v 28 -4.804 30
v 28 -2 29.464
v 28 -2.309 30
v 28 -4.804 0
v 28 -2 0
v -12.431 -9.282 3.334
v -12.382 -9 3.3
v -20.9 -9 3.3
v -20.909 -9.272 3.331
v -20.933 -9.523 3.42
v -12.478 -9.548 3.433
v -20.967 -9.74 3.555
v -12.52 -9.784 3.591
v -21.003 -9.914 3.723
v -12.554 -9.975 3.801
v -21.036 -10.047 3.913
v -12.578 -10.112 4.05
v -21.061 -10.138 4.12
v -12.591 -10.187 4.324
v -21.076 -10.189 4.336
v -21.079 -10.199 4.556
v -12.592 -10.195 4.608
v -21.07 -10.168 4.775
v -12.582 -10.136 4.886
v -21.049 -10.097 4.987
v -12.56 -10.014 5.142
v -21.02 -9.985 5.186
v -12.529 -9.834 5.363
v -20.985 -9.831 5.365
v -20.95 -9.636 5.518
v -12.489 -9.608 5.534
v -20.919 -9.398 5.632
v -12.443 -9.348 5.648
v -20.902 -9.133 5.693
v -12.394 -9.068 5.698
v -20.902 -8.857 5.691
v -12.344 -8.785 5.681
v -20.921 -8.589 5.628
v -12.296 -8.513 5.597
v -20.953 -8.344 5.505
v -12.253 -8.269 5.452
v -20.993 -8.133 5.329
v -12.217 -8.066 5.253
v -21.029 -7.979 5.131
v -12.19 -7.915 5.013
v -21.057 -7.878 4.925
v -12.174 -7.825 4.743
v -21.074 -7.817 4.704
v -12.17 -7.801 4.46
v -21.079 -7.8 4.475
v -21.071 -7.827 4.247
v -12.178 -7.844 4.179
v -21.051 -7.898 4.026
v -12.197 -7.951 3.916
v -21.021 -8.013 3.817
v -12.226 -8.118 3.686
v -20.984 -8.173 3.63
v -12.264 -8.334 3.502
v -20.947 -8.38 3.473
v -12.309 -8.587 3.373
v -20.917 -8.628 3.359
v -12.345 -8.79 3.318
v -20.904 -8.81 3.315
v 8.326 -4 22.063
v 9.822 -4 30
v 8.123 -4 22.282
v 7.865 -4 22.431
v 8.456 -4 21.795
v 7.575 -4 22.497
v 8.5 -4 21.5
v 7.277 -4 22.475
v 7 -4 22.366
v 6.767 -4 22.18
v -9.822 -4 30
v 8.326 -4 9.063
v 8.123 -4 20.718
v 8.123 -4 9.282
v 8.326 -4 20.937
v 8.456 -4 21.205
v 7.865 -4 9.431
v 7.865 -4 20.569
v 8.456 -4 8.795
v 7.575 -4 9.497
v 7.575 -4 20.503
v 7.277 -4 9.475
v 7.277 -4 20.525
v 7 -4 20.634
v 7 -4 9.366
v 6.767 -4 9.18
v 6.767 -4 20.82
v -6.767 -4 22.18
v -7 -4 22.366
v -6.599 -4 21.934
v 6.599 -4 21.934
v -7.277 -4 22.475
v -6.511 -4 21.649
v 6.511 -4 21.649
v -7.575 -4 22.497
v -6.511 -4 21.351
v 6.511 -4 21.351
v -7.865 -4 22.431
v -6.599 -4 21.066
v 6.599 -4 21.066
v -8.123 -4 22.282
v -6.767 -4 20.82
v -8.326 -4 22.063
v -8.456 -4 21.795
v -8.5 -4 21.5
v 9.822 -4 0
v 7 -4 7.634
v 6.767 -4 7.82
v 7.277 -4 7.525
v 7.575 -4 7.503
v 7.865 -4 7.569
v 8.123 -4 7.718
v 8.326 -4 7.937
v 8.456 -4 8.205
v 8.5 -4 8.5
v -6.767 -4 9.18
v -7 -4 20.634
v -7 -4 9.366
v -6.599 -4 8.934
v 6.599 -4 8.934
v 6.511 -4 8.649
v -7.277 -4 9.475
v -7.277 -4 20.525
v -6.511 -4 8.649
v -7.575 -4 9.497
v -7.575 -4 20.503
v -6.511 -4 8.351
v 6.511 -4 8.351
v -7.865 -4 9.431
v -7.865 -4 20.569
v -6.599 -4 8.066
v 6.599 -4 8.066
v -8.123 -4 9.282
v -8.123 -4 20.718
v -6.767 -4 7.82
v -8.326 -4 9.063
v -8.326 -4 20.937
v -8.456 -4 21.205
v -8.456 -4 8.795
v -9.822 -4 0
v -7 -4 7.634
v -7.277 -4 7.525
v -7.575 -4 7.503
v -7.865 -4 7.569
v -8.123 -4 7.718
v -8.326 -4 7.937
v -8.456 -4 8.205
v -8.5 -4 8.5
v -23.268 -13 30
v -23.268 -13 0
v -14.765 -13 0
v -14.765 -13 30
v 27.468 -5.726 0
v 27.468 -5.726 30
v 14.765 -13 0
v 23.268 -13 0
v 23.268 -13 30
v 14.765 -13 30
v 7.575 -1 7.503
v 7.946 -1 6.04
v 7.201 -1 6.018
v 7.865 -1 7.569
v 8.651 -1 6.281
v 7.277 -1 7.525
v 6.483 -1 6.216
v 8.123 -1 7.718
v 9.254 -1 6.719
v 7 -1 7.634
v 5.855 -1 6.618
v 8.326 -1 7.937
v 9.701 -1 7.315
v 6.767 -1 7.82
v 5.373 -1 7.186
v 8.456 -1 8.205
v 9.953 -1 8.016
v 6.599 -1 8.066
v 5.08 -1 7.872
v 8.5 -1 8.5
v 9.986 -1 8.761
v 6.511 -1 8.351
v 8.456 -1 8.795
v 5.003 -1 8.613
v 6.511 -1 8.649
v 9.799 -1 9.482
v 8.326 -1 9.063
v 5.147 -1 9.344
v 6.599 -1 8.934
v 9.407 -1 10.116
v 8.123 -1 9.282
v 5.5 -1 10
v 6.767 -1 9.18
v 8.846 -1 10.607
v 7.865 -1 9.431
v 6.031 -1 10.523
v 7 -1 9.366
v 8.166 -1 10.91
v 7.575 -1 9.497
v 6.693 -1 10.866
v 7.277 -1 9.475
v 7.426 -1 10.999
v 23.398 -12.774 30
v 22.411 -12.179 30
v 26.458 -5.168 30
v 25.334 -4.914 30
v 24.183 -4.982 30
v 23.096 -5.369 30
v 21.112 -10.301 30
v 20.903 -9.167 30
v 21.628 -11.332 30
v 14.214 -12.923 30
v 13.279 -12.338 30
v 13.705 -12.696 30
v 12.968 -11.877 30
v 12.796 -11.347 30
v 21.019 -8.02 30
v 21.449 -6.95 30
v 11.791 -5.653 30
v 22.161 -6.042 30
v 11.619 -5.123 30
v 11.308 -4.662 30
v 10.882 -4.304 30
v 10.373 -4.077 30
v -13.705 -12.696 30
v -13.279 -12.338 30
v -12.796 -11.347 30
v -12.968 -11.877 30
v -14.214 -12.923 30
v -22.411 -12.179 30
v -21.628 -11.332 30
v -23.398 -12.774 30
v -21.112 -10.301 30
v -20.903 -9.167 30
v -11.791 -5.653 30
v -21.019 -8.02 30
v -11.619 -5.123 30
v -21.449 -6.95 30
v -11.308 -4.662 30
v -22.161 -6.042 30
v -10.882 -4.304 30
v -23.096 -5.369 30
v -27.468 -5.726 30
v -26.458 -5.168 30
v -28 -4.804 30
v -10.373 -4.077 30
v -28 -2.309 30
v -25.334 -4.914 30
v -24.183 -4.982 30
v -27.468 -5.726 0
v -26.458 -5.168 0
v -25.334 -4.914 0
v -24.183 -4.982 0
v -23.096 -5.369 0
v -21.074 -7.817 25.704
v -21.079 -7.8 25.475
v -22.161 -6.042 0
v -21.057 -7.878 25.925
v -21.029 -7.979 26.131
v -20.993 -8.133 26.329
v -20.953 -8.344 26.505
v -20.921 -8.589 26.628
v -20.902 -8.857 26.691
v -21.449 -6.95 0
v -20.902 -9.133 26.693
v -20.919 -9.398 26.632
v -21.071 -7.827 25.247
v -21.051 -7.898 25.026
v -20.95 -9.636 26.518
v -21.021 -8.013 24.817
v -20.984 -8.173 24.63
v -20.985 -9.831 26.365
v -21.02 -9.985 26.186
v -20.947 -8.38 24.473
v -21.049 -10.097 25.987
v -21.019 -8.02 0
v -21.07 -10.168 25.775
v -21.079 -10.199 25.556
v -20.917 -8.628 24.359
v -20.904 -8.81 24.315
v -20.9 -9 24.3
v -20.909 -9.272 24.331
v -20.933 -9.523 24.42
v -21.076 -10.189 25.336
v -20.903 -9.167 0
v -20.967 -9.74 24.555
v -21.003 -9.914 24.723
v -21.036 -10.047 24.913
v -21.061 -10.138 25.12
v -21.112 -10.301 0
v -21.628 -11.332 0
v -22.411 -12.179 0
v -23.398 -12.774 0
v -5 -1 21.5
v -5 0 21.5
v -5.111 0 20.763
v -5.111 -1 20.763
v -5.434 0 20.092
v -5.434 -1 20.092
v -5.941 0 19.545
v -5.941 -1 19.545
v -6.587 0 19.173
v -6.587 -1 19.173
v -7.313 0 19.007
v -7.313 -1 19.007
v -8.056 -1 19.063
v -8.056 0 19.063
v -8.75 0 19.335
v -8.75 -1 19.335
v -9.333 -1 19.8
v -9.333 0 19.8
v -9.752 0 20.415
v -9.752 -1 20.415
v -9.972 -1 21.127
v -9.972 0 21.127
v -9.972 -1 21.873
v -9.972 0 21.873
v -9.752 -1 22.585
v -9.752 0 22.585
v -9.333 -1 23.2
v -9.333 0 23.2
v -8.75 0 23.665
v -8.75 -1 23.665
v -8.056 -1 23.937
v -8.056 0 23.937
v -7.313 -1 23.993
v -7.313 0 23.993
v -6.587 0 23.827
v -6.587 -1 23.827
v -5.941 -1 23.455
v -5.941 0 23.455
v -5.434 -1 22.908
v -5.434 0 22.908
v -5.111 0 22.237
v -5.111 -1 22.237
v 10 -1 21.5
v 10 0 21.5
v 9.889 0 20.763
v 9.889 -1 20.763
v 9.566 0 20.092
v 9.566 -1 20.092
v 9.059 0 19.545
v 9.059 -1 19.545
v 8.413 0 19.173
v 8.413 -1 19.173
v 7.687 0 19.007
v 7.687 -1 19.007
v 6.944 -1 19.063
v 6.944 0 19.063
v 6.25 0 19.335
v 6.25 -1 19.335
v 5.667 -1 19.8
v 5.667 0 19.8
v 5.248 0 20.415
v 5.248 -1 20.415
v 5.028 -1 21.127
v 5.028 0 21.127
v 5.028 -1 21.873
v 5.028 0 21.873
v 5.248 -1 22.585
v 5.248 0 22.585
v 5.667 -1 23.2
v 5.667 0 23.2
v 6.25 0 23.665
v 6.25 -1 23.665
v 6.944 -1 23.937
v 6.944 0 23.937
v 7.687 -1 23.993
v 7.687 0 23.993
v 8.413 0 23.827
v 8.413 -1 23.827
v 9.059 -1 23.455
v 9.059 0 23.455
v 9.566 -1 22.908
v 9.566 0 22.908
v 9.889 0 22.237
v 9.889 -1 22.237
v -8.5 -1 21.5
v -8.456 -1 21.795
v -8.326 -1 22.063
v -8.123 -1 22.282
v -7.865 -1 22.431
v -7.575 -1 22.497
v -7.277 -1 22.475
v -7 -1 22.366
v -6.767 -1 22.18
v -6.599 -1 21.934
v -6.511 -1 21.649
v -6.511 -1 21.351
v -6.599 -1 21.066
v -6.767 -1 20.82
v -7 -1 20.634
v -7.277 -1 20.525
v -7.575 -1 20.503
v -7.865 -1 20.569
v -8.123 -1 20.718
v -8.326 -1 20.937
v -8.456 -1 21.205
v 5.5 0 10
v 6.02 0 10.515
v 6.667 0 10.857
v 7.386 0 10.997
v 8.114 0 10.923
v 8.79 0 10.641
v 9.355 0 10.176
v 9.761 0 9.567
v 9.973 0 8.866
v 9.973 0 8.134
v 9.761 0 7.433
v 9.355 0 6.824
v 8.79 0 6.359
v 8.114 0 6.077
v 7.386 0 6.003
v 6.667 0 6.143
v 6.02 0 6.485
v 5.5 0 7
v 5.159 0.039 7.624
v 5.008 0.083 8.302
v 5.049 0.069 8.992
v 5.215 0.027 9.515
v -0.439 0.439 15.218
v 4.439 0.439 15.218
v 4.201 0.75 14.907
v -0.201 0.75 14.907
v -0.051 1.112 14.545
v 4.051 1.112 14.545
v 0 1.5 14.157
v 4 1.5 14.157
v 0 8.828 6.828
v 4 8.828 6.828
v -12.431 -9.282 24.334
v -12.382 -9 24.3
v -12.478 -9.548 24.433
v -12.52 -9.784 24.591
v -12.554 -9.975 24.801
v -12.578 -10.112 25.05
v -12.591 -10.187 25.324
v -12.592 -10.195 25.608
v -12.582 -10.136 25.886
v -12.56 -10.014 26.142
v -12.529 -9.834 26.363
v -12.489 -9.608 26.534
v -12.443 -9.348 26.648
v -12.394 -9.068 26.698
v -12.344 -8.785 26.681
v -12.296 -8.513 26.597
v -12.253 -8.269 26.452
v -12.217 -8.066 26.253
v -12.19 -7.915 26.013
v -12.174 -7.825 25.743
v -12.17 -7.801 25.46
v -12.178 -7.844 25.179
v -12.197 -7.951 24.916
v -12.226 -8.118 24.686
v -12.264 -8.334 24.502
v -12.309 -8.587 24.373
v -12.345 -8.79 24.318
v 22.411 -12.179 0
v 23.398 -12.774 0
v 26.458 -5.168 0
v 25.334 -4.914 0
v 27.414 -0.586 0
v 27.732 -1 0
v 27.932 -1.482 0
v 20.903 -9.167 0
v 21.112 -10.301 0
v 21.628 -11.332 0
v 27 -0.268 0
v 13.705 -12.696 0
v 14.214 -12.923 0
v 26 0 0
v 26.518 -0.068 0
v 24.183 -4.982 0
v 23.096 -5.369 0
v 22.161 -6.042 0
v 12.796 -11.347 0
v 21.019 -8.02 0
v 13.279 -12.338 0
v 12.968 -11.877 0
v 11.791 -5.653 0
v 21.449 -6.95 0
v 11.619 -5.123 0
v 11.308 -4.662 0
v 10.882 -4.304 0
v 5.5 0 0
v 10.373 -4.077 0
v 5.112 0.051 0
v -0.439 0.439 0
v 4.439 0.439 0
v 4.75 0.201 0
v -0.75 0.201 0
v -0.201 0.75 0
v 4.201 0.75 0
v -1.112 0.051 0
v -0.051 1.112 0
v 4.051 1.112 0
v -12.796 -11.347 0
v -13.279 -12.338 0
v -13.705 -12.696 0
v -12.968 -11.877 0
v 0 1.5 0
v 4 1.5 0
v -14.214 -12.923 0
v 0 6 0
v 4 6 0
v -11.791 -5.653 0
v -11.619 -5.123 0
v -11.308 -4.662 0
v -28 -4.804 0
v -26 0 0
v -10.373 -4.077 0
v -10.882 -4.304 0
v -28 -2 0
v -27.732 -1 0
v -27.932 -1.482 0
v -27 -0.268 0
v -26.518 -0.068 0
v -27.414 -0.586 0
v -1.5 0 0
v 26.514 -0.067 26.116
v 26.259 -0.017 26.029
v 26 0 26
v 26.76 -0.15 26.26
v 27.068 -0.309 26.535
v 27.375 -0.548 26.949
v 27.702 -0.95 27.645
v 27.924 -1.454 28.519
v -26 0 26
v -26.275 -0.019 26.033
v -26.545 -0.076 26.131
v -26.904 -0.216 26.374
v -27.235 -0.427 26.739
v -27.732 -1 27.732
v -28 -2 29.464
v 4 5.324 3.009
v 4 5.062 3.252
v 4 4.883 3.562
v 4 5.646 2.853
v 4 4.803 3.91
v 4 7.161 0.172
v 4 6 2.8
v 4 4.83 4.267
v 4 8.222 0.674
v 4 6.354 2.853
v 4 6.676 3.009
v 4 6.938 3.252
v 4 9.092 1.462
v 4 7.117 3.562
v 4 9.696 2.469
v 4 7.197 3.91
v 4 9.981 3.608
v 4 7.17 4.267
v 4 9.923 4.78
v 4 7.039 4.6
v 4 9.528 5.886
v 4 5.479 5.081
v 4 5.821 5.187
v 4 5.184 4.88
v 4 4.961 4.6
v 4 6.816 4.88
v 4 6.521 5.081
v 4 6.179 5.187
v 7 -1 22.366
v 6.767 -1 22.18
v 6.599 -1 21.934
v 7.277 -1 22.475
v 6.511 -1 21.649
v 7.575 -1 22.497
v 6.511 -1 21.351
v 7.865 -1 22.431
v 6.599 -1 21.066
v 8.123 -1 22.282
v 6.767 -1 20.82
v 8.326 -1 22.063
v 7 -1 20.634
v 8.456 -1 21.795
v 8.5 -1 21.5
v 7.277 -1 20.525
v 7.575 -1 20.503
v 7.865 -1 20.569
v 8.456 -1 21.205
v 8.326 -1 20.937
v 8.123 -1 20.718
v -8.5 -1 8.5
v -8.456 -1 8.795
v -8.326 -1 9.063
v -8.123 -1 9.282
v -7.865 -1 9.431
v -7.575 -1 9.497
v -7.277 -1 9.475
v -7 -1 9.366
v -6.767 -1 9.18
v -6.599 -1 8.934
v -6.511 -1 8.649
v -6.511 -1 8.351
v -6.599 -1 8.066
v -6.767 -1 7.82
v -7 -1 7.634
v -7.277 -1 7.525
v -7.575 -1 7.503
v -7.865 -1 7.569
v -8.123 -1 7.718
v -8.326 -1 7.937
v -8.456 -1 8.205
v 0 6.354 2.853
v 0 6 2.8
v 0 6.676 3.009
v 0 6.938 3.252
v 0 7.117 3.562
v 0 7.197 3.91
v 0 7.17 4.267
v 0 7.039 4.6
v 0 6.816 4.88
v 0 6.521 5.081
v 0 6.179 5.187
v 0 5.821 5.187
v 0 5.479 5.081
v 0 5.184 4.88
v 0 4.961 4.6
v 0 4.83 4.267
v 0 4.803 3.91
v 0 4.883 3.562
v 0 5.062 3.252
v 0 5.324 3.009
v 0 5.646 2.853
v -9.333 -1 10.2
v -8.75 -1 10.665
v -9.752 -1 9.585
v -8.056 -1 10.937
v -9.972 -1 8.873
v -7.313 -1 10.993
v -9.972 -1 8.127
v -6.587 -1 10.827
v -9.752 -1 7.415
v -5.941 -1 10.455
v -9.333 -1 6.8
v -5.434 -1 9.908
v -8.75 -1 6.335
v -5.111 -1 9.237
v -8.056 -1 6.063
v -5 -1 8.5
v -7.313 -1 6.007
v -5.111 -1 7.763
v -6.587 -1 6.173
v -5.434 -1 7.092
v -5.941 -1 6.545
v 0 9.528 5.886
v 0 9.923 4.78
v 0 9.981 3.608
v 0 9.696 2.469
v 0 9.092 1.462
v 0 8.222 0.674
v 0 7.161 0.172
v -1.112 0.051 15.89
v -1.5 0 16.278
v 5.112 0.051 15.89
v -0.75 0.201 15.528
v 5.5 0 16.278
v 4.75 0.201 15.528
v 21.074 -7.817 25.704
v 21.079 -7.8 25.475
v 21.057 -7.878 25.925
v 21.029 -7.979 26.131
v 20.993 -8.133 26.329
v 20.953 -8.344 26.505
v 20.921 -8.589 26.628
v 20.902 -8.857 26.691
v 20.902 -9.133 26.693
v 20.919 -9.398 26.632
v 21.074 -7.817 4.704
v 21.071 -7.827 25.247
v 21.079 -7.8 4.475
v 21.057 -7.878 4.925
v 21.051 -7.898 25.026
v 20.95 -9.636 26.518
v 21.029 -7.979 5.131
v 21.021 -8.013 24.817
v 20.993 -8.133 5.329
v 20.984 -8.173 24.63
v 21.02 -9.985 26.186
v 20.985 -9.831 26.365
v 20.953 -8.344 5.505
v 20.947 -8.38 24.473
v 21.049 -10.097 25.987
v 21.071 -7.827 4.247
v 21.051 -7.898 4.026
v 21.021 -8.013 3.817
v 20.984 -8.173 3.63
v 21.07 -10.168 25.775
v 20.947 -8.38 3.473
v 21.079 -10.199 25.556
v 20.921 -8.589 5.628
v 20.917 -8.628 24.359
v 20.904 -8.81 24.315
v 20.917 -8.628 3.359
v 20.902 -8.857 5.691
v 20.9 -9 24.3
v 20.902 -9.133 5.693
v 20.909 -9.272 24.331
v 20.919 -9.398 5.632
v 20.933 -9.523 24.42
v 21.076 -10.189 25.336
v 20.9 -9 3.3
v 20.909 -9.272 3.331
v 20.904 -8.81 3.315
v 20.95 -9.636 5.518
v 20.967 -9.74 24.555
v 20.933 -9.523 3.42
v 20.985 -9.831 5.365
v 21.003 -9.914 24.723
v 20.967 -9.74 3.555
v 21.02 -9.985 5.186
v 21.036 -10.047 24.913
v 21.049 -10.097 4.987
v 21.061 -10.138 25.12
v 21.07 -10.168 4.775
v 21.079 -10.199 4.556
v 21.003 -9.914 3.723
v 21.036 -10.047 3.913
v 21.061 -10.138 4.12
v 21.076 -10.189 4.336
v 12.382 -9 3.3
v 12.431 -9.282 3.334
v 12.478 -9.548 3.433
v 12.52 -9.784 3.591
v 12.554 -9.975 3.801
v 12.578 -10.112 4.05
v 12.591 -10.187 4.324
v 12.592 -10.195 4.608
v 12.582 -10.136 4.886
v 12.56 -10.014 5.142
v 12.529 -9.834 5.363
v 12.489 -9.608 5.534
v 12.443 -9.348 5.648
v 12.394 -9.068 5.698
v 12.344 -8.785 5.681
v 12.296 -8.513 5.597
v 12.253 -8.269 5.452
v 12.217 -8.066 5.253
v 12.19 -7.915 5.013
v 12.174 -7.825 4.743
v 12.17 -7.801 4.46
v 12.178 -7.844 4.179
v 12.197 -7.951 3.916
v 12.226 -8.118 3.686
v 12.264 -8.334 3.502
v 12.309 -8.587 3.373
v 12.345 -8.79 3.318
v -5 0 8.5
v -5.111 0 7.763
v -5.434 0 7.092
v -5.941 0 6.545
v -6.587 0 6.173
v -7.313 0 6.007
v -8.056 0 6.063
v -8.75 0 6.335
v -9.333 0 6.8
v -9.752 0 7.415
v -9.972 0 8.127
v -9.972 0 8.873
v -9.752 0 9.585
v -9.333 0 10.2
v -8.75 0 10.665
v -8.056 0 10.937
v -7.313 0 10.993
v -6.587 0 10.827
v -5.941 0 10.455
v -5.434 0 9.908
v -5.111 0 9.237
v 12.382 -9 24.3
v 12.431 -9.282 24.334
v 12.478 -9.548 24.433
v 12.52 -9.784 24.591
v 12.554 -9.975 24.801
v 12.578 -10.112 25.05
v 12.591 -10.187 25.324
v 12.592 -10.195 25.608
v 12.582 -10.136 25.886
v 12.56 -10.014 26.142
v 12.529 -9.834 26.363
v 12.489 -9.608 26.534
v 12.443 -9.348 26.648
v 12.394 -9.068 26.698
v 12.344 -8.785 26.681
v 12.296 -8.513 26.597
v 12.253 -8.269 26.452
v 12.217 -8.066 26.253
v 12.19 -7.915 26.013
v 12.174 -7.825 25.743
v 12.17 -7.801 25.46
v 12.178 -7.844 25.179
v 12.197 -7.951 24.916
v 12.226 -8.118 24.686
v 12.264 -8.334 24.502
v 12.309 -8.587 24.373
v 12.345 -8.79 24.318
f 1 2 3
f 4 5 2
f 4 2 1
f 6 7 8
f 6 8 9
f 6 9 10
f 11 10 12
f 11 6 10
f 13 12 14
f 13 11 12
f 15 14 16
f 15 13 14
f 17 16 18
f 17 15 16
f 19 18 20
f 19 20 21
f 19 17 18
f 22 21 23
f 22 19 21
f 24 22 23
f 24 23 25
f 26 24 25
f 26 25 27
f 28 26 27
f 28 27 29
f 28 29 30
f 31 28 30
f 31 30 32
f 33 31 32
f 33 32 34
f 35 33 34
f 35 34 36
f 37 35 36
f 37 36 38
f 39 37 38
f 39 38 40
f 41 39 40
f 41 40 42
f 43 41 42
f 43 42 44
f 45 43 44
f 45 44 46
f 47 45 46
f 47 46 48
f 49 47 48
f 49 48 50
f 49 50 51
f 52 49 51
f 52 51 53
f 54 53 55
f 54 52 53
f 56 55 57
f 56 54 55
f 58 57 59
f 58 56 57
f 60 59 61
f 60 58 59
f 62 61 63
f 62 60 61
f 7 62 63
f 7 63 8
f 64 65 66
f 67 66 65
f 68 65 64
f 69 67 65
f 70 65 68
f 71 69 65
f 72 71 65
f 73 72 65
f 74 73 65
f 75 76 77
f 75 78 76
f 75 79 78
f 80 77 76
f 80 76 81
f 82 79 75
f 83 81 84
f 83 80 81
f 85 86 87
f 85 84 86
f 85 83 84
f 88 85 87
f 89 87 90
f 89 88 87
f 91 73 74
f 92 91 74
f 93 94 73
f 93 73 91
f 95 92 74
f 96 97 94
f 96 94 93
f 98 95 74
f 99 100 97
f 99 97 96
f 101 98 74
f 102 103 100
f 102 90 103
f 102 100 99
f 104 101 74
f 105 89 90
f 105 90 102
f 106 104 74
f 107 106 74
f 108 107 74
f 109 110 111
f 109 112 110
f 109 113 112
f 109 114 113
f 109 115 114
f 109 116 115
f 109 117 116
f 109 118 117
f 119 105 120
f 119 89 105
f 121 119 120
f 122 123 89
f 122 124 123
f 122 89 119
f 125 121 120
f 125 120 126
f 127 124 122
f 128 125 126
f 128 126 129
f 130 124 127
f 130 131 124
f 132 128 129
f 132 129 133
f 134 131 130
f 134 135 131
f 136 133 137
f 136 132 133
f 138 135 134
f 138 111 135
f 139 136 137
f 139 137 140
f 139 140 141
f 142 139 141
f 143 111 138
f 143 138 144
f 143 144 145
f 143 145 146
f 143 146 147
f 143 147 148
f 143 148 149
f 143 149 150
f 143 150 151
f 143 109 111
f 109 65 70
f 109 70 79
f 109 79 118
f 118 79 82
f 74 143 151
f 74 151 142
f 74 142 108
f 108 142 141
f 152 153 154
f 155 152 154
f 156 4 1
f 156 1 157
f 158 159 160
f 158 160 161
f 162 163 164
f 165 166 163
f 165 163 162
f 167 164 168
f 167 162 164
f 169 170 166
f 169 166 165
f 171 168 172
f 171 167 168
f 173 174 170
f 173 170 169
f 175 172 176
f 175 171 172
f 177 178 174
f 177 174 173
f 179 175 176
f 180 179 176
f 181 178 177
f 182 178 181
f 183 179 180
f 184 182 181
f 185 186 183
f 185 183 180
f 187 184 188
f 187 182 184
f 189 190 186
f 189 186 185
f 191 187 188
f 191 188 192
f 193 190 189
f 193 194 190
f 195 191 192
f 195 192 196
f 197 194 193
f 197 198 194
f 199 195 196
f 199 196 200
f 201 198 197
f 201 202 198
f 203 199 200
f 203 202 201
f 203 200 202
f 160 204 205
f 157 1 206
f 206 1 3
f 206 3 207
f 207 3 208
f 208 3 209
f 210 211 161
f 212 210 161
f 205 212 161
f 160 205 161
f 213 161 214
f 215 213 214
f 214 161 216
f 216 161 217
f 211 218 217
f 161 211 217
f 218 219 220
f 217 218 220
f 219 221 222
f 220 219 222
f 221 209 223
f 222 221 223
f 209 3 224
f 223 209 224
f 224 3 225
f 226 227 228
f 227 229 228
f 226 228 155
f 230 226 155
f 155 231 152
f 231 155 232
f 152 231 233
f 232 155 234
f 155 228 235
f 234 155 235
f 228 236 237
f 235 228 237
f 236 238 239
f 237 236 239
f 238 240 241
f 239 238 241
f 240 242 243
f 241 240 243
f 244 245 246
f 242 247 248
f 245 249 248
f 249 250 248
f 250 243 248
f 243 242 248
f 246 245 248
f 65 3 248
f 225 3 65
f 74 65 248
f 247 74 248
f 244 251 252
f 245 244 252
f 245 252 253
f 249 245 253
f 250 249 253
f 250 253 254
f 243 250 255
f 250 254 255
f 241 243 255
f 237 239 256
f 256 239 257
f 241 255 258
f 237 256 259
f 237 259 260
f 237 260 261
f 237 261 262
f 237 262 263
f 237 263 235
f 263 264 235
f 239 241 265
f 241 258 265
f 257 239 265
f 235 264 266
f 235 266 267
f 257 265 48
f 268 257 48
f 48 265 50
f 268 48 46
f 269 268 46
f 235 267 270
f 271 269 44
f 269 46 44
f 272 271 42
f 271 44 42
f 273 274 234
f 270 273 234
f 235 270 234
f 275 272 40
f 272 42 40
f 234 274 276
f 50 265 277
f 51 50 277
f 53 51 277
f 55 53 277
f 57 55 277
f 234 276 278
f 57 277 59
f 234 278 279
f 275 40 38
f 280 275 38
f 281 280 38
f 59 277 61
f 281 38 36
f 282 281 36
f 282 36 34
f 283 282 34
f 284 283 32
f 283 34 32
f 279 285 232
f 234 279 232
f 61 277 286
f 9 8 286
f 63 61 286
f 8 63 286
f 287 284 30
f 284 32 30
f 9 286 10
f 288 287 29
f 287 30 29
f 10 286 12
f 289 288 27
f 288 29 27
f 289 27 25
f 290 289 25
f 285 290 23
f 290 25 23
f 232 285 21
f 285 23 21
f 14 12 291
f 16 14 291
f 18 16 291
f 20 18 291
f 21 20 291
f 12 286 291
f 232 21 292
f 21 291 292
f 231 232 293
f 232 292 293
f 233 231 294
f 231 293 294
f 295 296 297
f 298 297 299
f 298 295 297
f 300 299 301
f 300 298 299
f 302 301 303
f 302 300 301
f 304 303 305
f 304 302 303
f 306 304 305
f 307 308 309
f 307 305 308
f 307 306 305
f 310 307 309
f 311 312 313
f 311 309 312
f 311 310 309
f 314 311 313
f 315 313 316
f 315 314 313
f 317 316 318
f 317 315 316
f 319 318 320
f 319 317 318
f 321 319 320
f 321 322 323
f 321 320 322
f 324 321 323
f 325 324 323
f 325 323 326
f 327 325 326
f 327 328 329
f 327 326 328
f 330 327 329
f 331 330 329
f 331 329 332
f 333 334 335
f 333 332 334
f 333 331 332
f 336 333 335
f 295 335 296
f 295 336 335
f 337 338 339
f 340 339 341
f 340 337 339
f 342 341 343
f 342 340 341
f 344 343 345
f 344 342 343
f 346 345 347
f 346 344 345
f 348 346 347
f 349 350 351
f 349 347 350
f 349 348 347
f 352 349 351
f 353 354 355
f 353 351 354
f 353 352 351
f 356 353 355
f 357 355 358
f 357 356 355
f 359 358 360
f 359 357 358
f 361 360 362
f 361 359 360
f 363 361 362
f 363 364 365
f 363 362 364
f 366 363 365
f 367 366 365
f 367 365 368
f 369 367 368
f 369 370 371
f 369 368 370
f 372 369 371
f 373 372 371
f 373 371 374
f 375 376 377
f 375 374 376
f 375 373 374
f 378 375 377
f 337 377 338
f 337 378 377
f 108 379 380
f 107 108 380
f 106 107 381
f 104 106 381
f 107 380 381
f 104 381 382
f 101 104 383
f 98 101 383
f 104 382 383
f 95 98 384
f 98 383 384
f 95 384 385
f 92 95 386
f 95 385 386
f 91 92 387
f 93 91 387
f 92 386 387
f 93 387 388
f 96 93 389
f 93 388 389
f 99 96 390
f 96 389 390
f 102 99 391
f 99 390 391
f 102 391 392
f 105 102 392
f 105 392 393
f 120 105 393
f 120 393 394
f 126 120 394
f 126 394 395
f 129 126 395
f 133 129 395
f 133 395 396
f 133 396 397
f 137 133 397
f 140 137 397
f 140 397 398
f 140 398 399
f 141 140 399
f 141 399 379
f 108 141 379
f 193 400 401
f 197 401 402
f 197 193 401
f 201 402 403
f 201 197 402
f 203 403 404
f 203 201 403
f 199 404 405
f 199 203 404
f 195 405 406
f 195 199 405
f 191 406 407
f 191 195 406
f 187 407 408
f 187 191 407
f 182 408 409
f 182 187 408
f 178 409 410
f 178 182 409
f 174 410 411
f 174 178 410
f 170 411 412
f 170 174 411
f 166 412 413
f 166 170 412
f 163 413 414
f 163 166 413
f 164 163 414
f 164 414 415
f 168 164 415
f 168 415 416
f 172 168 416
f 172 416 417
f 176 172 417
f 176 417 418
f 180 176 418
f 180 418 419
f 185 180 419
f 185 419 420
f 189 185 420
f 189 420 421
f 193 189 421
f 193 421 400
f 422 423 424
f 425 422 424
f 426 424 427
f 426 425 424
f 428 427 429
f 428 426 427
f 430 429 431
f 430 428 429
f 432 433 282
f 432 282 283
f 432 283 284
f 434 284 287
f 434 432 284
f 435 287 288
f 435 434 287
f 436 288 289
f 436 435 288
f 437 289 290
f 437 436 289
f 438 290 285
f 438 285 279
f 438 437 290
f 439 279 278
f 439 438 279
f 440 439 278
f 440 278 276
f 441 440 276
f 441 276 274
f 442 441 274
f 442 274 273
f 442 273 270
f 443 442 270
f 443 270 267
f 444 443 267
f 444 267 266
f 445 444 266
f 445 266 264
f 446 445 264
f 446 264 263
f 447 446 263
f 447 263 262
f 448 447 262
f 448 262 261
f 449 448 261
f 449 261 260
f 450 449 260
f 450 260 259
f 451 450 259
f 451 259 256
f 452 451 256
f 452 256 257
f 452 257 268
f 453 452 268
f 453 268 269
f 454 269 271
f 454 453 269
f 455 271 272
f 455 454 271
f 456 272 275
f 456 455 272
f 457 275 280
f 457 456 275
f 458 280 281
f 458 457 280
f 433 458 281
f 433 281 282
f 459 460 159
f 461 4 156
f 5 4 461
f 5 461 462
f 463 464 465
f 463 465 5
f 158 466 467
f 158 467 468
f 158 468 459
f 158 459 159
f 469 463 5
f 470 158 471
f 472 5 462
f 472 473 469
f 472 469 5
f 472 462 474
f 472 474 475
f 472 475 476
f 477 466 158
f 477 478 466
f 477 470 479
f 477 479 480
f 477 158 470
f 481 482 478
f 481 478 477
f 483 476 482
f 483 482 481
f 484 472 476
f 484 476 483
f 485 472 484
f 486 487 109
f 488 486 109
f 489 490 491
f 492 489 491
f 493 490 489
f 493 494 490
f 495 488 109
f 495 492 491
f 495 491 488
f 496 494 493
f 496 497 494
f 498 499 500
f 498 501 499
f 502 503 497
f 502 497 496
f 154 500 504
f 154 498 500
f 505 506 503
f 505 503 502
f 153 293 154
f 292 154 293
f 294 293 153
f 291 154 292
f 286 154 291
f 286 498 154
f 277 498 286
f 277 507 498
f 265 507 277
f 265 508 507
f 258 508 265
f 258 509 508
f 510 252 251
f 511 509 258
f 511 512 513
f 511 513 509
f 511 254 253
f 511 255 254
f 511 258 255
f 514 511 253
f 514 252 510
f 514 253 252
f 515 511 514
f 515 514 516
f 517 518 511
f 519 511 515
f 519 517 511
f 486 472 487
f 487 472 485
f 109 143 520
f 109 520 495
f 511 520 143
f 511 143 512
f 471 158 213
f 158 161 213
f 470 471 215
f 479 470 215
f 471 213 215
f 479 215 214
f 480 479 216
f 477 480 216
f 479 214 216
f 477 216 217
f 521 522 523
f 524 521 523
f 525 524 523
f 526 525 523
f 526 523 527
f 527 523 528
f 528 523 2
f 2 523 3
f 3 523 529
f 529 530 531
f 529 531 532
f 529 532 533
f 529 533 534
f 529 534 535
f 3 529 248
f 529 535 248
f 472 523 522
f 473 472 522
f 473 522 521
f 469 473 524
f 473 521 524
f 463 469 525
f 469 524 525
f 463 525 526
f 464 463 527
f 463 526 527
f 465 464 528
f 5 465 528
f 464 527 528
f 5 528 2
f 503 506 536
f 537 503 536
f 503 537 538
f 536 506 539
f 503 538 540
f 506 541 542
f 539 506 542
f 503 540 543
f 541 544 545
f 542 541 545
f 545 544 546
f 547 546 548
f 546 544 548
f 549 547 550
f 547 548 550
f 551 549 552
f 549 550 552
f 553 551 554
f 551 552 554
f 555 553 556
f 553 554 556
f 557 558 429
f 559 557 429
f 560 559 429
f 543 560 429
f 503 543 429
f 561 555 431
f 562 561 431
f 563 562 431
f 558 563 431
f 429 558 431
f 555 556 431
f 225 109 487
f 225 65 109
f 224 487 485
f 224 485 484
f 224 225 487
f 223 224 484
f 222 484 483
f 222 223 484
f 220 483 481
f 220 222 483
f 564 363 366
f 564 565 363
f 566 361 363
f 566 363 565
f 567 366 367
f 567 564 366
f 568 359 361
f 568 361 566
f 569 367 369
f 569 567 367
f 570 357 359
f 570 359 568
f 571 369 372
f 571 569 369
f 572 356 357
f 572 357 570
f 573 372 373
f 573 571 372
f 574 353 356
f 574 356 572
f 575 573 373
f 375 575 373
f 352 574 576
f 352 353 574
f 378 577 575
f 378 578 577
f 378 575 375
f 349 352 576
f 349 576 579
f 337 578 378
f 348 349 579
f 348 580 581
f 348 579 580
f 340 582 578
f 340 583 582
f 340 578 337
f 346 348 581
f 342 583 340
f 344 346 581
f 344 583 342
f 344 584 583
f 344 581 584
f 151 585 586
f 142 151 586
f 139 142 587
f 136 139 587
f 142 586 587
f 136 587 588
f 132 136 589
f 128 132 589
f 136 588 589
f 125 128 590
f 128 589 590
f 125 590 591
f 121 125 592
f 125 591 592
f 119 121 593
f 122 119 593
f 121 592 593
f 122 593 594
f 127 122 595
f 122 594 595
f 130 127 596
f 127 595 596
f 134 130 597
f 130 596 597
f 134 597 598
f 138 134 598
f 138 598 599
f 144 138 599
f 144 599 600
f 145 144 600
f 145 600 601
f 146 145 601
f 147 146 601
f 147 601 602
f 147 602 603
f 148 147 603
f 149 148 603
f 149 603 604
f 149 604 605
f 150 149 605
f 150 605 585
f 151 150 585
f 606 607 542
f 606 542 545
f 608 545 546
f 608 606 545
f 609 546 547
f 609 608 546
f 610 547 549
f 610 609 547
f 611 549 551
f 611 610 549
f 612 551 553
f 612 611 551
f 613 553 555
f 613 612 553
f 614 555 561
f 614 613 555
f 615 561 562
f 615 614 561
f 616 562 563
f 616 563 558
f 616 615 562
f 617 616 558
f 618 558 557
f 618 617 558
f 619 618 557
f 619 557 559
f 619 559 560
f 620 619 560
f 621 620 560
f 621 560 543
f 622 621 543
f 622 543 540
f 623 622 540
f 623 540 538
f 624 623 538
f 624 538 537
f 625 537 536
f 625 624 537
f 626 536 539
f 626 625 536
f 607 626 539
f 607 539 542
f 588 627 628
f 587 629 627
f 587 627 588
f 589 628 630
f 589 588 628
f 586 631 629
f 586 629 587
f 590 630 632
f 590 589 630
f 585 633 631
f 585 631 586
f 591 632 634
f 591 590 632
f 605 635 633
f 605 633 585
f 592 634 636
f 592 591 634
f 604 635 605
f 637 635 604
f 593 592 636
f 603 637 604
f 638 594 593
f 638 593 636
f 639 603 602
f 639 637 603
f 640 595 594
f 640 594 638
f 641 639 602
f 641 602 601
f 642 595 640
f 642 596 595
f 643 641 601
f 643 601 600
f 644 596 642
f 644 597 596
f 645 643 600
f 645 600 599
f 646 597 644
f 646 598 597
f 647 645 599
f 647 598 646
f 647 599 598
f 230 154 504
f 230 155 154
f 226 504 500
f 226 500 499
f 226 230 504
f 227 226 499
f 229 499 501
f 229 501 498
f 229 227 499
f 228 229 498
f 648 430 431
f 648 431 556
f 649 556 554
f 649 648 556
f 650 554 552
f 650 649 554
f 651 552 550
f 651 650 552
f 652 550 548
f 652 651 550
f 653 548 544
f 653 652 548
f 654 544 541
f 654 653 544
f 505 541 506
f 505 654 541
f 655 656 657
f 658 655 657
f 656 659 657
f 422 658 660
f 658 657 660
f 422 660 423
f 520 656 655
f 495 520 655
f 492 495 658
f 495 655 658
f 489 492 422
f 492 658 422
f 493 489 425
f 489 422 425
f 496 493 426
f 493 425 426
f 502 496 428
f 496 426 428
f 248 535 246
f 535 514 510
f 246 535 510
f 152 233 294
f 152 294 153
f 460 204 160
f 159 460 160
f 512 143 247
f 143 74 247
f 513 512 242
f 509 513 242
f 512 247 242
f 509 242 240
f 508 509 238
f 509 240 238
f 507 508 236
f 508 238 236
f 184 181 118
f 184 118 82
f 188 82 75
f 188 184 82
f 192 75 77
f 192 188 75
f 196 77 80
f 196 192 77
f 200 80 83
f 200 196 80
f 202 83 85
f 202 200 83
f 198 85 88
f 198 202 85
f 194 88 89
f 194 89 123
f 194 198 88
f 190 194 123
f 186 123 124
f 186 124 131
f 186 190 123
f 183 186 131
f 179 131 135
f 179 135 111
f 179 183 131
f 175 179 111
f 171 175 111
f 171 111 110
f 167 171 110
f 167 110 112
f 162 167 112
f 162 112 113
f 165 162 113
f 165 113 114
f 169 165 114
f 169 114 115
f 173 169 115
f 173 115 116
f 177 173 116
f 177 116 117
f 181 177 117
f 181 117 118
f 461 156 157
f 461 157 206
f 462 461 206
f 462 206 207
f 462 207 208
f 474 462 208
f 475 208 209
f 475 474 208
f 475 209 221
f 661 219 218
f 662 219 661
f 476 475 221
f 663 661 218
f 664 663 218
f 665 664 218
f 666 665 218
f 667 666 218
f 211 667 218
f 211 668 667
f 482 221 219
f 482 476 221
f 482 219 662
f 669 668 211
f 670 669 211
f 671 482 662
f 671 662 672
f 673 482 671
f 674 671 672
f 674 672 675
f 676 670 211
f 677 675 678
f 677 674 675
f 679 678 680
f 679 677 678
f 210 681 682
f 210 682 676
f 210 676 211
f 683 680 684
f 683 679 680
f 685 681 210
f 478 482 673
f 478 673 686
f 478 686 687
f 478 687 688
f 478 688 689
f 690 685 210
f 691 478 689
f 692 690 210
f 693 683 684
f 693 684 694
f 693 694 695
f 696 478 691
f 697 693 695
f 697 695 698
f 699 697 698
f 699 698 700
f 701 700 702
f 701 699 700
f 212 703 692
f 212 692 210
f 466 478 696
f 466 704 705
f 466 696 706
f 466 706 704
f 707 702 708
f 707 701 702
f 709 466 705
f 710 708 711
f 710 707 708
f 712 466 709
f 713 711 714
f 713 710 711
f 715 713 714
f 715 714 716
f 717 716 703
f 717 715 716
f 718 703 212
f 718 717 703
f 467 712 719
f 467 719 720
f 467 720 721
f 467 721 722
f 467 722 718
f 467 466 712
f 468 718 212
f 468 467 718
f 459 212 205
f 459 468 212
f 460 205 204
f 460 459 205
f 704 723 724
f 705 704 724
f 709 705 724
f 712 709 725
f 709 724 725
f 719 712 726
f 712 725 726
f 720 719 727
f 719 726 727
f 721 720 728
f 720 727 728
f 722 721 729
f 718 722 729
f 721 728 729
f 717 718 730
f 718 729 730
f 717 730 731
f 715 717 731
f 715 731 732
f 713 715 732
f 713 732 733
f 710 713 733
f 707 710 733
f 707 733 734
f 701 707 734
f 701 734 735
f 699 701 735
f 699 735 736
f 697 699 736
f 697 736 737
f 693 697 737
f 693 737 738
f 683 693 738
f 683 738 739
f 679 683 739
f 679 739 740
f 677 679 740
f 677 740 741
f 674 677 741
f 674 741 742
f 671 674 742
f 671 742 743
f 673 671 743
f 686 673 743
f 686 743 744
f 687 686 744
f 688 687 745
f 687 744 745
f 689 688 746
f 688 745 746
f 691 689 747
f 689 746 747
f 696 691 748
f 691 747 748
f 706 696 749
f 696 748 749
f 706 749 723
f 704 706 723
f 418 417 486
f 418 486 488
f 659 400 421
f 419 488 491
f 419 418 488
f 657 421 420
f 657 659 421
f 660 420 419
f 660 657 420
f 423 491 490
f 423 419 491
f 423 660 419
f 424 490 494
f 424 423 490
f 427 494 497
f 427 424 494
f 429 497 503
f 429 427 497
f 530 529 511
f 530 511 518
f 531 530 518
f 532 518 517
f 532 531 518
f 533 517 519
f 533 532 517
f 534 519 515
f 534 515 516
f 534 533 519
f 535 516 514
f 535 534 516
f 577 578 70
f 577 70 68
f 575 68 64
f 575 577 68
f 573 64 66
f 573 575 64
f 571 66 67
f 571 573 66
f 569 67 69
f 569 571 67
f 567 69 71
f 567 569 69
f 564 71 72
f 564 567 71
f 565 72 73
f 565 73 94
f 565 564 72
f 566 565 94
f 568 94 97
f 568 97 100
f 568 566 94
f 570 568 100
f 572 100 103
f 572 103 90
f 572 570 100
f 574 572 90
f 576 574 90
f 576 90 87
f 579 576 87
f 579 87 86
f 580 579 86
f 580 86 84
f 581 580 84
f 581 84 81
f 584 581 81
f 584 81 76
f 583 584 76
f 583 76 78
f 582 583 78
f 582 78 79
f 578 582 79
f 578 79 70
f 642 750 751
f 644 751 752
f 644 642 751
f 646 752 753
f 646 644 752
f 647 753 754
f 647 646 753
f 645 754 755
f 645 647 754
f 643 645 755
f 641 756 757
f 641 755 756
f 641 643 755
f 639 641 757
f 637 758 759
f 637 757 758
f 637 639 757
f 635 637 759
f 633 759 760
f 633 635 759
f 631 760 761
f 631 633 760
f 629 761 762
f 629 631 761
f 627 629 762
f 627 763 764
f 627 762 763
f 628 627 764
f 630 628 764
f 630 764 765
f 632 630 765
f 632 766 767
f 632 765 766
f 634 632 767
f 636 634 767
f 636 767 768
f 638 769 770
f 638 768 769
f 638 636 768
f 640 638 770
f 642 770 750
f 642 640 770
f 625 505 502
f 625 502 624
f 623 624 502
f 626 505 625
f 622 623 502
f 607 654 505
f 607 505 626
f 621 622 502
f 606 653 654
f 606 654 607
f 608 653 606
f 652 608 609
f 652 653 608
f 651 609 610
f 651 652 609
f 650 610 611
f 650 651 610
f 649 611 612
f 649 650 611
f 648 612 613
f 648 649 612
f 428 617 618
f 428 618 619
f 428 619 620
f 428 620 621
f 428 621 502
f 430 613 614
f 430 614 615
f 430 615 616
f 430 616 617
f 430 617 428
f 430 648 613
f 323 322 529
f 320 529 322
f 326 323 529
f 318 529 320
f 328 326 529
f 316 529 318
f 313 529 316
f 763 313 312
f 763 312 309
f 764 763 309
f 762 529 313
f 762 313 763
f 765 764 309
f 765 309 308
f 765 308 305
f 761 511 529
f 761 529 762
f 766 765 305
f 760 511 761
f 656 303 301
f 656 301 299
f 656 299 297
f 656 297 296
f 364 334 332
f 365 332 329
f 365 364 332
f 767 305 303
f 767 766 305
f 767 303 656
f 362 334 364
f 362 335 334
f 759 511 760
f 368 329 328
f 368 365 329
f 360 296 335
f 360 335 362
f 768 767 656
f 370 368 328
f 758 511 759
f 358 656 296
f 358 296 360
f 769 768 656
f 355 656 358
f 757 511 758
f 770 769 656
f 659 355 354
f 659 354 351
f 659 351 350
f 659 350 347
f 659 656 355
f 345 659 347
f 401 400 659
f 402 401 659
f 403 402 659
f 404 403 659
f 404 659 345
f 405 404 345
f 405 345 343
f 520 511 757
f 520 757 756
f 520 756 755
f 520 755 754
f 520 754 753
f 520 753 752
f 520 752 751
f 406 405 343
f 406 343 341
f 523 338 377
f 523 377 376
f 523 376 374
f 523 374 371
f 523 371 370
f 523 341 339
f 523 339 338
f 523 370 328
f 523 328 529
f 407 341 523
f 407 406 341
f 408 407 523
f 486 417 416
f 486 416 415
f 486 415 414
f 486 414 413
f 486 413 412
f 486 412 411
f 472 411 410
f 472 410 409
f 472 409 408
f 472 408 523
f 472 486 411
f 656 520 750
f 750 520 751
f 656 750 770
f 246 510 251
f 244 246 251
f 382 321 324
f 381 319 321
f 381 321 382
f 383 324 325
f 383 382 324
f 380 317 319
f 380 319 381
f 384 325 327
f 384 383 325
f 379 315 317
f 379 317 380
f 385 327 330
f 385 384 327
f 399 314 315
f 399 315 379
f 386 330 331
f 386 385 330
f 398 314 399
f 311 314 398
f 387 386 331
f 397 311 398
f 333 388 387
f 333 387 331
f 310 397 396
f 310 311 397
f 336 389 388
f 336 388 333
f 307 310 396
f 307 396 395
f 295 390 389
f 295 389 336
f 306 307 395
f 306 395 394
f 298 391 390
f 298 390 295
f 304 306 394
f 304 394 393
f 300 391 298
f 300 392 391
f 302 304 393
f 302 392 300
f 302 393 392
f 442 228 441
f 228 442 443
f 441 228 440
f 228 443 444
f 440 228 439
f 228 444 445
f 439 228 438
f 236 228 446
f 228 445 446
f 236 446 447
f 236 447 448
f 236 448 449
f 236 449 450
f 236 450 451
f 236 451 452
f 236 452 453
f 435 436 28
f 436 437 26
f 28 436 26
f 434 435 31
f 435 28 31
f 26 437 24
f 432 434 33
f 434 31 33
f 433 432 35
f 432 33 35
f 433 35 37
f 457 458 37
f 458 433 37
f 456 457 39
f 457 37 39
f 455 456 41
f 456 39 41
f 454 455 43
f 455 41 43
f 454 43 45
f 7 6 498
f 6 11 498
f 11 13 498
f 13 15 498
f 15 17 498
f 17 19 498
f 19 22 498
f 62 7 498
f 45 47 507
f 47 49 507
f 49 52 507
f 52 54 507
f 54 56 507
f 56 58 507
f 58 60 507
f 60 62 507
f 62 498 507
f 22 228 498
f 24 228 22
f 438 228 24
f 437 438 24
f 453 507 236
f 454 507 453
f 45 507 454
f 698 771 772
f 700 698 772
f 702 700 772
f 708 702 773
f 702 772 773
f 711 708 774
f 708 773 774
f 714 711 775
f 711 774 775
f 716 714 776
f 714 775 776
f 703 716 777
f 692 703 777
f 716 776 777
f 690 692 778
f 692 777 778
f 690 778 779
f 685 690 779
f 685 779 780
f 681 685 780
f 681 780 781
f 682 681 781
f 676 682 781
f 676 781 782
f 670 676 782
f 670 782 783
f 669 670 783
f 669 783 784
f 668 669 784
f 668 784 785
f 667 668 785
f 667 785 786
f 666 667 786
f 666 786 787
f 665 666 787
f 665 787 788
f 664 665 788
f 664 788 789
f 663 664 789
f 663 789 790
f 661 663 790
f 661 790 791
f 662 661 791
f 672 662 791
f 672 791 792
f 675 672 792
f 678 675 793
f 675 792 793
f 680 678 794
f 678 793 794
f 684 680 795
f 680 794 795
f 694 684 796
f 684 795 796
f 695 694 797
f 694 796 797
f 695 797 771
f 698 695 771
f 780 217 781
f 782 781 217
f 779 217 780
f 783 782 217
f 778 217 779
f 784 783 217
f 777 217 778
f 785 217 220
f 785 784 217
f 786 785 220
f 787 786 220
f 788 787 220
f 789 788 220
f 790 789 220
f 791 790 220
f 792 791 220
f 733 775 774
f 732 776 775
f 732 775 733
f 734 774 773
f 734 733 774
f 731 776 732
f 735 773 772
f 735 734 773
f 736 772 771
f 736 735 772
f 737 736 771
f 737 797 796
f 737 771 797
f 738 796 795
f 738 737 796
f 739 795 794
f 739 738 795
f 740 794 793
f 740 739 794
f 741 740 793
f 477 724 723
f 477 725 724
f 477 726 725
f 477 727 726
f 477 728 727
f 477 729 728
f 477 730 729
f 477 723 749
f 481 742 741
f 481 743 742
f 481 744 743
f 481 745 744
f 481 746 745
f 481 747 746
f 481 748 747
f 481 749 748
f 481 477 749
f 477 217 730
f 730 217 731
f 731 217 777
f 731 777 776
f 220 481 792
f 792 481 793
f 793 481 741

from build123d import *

# Parameters (mm, degrees)
BOSS_EXTRU_1_DEPTH           = 30
ESQUISSE3_R                  = 1
ENL_V_MAT_EXTRU_1_DEPTH      = 44.0464865
ESQUISSE4_R                  = 1.2
ENL_V_MAT_EXTRU_2_DEPTH      = 44.0464865
CONG_1_R                     = 2
ESQUISSE2_R                  = 1.2
BOSS_EXTRU_2_DEPTH           = 4
CONG_2_R                     = 1.5
ENL_V_MAT_EXTRU_3_DEPTH      = 44.04648657
ENL_V_MAT_EXTRU_3_DEPTH_BACK = 1
ESQUISSE5_R                  = 2.5
CHANFREIN1_SIZE              = 4
CHANFREIN1_SIZE_2            = 2.309401077


with BuildPart() as part:
    # Esquisse1 → Boss.-Extru.1 (new body)
    with BuildSketch(Plane.XY):
        with BuildLine():
            Line((0, 0), (-28, 0))
            Line((-28, 0), (-28, -4.803847577))
            Line((-28, -4.803847577), (-27.467711697, -5.725797963))
            ThreePointArc((-27.467711697, -5.725797963), (-21.449295844, -6.95), (-23.398313707, -12.774202037))
            Line((-23.398313707, -12.774202037), (-23.267949192, -13))
            Line((-23.267949192, -13), (-13.086942826, -13))
            Line((-13.086942826, -13), (-11.5, -4))
            Line((-11.5, -4), (0, -4))
            Line((0, -4), (0, 0))
        make_face()
    extrude(amount=BOSS_EXTRU_1_DEPTH)

    # Esquisse3 → Enlèv. mat.-Extru.1 (cut, through all)
    with BuildSketch(Plane(origin=(0, 0, 0), x_dir=(1, 0, 0), z_dir=(0, 1, 0))):
        with Locations(Location((-7.5, -8.5, 0), (0, 0, 180))):
            Circle(ESQUISSE3_R)
        with Locations(Location((-7.5, -21.5, 0), (0, 0, 180))):
            Circle(ESQUISSE3_R)
    extrude(amount=-ENL_V_MAT_EXTRU_1_DEPTH, mode=Mode.SUBTRACT)

    # Esquisse4 → Enlèv. mat.-Extru.2 (cut, through all)
    with BuildSketch(Plane.ZY):
        with Locations(Location((4.5, -9, 0), (0, 0, 180))):
            Circle(ESQUISSE4_R)
        with Locations(Location((25.5, -9, 0), (0, 0, 180))):
            Circle(ESQUISSE4_R)
    extrude(amount=ENL_V_MAT_EXTRU_2_DEPTH, mode=Mode.SUBTRACT)

    # Congé1
    cong_1_edges = [part.edges().sort_by_distance(p)[0] for p in [
        (-11.5, -4, 15),
        (-13.086942826, -13, 15),
        (-28, 0, 15),
    ]]
    fillet(cong_1_edges, radius=CONG_1_R)

    # Symétrie1: part across plane


with BuildPart() as part_1:
    add(part.part)
    add(part.part.mirror(Plane(origin=(0, -4, 30), x_dir=(0, 0, 1), z_dir=(-1, 0, 0))))

    # Esquisse2 → Boss.-Extru.2 (add)
    with BuildSketch(Plane(origin=(0, 0, 0), x_dir=(0, 0, -1), z_dir=(1, 0, 0))):
        with BuildLine():
            Line((0, 0), (-15.656854249, 0))
            Line((-15.656854249, 0), (-6.828427125, 8.828427125))
            ThreePointArc((-6.828427125, 8.828427125), (-2.469266271, 9.69551813), (0, 6))
            Line((0, 6), (0, 0))
        make_face()
        with Locations((-4, 6)):
            Circle(ESQUISSE2_R, mode=Mode.SUBTRACT)
    extrude(amount=BOSS_EXTRU_2_DEPTH)

    # Congé2
    cong_2_edges = [part_1.edges().sort_by_distance(p)[0] for p in [
        (4, 0, 7.828427125),
        (0, 0, 7.828427125),
        (2, 0, 15.656854249),
    ]]
    fillet(cong_2_edges, radius=CONG_2_R)

    # Esquisse5 → Enlèv. mat.-Extru.3 (cut, two sides: drawn at the far end of the back side and taken through both)
    with BuildSketch(Plane(origin=(0, 0, 0), x_dir=(1, 0, 0), z_dir=(0, 1, 0)).offset(-ENL_V_MAT_EXTRU_3_DEPTH_BACK)):
        with Locations((-7.5, -8.5)):
            Circle(ESQUISSE5_R)
        with Locations((-7.5, -21.5)):
            Circle(ESQUISSE5_R)
        with Locations(Location((7.5, -8.5, 0), (0, 0, 216.869897646))):
            Circle(ESQUISSE5_R)
        with Locations((7.5, -21.5)):
            Circle(ESQUISSE5_R)
    extrude(amount=ENL_V_MAT_EXTRU_3_DEPTH + ENL_V_MAT_EXTRU_3_DEPTH_BACK, mode=Mode.SUBTRACT)

    # Chanfrein1
    # the kernel refuses this chamfer: 4, 2.309401077 mm, written as the material it takes off along each edge
    with BuildSketch(Plane(origin=(-36.348343019, 0, 30), x_dir=(0, 0.019326765612700744, -0.9998132206222079), z_dir=(1, 0, 0))) as chanfrein1_piece_1:
        Polygon((CHANFREIN1_SIZE * 0.999813220622, -CHANFREIN1_SIZE * 0.0193267656127), (-CHANFREIN1_SIZE_2 * 0.0193267656107, -CHANFREIN1_SIZE_2 * 0.999813220518), (0, 0), align=None)
    extrude(amount=72.696686037, mode=Mode.SUBTRACT)


solid = part_1.part
